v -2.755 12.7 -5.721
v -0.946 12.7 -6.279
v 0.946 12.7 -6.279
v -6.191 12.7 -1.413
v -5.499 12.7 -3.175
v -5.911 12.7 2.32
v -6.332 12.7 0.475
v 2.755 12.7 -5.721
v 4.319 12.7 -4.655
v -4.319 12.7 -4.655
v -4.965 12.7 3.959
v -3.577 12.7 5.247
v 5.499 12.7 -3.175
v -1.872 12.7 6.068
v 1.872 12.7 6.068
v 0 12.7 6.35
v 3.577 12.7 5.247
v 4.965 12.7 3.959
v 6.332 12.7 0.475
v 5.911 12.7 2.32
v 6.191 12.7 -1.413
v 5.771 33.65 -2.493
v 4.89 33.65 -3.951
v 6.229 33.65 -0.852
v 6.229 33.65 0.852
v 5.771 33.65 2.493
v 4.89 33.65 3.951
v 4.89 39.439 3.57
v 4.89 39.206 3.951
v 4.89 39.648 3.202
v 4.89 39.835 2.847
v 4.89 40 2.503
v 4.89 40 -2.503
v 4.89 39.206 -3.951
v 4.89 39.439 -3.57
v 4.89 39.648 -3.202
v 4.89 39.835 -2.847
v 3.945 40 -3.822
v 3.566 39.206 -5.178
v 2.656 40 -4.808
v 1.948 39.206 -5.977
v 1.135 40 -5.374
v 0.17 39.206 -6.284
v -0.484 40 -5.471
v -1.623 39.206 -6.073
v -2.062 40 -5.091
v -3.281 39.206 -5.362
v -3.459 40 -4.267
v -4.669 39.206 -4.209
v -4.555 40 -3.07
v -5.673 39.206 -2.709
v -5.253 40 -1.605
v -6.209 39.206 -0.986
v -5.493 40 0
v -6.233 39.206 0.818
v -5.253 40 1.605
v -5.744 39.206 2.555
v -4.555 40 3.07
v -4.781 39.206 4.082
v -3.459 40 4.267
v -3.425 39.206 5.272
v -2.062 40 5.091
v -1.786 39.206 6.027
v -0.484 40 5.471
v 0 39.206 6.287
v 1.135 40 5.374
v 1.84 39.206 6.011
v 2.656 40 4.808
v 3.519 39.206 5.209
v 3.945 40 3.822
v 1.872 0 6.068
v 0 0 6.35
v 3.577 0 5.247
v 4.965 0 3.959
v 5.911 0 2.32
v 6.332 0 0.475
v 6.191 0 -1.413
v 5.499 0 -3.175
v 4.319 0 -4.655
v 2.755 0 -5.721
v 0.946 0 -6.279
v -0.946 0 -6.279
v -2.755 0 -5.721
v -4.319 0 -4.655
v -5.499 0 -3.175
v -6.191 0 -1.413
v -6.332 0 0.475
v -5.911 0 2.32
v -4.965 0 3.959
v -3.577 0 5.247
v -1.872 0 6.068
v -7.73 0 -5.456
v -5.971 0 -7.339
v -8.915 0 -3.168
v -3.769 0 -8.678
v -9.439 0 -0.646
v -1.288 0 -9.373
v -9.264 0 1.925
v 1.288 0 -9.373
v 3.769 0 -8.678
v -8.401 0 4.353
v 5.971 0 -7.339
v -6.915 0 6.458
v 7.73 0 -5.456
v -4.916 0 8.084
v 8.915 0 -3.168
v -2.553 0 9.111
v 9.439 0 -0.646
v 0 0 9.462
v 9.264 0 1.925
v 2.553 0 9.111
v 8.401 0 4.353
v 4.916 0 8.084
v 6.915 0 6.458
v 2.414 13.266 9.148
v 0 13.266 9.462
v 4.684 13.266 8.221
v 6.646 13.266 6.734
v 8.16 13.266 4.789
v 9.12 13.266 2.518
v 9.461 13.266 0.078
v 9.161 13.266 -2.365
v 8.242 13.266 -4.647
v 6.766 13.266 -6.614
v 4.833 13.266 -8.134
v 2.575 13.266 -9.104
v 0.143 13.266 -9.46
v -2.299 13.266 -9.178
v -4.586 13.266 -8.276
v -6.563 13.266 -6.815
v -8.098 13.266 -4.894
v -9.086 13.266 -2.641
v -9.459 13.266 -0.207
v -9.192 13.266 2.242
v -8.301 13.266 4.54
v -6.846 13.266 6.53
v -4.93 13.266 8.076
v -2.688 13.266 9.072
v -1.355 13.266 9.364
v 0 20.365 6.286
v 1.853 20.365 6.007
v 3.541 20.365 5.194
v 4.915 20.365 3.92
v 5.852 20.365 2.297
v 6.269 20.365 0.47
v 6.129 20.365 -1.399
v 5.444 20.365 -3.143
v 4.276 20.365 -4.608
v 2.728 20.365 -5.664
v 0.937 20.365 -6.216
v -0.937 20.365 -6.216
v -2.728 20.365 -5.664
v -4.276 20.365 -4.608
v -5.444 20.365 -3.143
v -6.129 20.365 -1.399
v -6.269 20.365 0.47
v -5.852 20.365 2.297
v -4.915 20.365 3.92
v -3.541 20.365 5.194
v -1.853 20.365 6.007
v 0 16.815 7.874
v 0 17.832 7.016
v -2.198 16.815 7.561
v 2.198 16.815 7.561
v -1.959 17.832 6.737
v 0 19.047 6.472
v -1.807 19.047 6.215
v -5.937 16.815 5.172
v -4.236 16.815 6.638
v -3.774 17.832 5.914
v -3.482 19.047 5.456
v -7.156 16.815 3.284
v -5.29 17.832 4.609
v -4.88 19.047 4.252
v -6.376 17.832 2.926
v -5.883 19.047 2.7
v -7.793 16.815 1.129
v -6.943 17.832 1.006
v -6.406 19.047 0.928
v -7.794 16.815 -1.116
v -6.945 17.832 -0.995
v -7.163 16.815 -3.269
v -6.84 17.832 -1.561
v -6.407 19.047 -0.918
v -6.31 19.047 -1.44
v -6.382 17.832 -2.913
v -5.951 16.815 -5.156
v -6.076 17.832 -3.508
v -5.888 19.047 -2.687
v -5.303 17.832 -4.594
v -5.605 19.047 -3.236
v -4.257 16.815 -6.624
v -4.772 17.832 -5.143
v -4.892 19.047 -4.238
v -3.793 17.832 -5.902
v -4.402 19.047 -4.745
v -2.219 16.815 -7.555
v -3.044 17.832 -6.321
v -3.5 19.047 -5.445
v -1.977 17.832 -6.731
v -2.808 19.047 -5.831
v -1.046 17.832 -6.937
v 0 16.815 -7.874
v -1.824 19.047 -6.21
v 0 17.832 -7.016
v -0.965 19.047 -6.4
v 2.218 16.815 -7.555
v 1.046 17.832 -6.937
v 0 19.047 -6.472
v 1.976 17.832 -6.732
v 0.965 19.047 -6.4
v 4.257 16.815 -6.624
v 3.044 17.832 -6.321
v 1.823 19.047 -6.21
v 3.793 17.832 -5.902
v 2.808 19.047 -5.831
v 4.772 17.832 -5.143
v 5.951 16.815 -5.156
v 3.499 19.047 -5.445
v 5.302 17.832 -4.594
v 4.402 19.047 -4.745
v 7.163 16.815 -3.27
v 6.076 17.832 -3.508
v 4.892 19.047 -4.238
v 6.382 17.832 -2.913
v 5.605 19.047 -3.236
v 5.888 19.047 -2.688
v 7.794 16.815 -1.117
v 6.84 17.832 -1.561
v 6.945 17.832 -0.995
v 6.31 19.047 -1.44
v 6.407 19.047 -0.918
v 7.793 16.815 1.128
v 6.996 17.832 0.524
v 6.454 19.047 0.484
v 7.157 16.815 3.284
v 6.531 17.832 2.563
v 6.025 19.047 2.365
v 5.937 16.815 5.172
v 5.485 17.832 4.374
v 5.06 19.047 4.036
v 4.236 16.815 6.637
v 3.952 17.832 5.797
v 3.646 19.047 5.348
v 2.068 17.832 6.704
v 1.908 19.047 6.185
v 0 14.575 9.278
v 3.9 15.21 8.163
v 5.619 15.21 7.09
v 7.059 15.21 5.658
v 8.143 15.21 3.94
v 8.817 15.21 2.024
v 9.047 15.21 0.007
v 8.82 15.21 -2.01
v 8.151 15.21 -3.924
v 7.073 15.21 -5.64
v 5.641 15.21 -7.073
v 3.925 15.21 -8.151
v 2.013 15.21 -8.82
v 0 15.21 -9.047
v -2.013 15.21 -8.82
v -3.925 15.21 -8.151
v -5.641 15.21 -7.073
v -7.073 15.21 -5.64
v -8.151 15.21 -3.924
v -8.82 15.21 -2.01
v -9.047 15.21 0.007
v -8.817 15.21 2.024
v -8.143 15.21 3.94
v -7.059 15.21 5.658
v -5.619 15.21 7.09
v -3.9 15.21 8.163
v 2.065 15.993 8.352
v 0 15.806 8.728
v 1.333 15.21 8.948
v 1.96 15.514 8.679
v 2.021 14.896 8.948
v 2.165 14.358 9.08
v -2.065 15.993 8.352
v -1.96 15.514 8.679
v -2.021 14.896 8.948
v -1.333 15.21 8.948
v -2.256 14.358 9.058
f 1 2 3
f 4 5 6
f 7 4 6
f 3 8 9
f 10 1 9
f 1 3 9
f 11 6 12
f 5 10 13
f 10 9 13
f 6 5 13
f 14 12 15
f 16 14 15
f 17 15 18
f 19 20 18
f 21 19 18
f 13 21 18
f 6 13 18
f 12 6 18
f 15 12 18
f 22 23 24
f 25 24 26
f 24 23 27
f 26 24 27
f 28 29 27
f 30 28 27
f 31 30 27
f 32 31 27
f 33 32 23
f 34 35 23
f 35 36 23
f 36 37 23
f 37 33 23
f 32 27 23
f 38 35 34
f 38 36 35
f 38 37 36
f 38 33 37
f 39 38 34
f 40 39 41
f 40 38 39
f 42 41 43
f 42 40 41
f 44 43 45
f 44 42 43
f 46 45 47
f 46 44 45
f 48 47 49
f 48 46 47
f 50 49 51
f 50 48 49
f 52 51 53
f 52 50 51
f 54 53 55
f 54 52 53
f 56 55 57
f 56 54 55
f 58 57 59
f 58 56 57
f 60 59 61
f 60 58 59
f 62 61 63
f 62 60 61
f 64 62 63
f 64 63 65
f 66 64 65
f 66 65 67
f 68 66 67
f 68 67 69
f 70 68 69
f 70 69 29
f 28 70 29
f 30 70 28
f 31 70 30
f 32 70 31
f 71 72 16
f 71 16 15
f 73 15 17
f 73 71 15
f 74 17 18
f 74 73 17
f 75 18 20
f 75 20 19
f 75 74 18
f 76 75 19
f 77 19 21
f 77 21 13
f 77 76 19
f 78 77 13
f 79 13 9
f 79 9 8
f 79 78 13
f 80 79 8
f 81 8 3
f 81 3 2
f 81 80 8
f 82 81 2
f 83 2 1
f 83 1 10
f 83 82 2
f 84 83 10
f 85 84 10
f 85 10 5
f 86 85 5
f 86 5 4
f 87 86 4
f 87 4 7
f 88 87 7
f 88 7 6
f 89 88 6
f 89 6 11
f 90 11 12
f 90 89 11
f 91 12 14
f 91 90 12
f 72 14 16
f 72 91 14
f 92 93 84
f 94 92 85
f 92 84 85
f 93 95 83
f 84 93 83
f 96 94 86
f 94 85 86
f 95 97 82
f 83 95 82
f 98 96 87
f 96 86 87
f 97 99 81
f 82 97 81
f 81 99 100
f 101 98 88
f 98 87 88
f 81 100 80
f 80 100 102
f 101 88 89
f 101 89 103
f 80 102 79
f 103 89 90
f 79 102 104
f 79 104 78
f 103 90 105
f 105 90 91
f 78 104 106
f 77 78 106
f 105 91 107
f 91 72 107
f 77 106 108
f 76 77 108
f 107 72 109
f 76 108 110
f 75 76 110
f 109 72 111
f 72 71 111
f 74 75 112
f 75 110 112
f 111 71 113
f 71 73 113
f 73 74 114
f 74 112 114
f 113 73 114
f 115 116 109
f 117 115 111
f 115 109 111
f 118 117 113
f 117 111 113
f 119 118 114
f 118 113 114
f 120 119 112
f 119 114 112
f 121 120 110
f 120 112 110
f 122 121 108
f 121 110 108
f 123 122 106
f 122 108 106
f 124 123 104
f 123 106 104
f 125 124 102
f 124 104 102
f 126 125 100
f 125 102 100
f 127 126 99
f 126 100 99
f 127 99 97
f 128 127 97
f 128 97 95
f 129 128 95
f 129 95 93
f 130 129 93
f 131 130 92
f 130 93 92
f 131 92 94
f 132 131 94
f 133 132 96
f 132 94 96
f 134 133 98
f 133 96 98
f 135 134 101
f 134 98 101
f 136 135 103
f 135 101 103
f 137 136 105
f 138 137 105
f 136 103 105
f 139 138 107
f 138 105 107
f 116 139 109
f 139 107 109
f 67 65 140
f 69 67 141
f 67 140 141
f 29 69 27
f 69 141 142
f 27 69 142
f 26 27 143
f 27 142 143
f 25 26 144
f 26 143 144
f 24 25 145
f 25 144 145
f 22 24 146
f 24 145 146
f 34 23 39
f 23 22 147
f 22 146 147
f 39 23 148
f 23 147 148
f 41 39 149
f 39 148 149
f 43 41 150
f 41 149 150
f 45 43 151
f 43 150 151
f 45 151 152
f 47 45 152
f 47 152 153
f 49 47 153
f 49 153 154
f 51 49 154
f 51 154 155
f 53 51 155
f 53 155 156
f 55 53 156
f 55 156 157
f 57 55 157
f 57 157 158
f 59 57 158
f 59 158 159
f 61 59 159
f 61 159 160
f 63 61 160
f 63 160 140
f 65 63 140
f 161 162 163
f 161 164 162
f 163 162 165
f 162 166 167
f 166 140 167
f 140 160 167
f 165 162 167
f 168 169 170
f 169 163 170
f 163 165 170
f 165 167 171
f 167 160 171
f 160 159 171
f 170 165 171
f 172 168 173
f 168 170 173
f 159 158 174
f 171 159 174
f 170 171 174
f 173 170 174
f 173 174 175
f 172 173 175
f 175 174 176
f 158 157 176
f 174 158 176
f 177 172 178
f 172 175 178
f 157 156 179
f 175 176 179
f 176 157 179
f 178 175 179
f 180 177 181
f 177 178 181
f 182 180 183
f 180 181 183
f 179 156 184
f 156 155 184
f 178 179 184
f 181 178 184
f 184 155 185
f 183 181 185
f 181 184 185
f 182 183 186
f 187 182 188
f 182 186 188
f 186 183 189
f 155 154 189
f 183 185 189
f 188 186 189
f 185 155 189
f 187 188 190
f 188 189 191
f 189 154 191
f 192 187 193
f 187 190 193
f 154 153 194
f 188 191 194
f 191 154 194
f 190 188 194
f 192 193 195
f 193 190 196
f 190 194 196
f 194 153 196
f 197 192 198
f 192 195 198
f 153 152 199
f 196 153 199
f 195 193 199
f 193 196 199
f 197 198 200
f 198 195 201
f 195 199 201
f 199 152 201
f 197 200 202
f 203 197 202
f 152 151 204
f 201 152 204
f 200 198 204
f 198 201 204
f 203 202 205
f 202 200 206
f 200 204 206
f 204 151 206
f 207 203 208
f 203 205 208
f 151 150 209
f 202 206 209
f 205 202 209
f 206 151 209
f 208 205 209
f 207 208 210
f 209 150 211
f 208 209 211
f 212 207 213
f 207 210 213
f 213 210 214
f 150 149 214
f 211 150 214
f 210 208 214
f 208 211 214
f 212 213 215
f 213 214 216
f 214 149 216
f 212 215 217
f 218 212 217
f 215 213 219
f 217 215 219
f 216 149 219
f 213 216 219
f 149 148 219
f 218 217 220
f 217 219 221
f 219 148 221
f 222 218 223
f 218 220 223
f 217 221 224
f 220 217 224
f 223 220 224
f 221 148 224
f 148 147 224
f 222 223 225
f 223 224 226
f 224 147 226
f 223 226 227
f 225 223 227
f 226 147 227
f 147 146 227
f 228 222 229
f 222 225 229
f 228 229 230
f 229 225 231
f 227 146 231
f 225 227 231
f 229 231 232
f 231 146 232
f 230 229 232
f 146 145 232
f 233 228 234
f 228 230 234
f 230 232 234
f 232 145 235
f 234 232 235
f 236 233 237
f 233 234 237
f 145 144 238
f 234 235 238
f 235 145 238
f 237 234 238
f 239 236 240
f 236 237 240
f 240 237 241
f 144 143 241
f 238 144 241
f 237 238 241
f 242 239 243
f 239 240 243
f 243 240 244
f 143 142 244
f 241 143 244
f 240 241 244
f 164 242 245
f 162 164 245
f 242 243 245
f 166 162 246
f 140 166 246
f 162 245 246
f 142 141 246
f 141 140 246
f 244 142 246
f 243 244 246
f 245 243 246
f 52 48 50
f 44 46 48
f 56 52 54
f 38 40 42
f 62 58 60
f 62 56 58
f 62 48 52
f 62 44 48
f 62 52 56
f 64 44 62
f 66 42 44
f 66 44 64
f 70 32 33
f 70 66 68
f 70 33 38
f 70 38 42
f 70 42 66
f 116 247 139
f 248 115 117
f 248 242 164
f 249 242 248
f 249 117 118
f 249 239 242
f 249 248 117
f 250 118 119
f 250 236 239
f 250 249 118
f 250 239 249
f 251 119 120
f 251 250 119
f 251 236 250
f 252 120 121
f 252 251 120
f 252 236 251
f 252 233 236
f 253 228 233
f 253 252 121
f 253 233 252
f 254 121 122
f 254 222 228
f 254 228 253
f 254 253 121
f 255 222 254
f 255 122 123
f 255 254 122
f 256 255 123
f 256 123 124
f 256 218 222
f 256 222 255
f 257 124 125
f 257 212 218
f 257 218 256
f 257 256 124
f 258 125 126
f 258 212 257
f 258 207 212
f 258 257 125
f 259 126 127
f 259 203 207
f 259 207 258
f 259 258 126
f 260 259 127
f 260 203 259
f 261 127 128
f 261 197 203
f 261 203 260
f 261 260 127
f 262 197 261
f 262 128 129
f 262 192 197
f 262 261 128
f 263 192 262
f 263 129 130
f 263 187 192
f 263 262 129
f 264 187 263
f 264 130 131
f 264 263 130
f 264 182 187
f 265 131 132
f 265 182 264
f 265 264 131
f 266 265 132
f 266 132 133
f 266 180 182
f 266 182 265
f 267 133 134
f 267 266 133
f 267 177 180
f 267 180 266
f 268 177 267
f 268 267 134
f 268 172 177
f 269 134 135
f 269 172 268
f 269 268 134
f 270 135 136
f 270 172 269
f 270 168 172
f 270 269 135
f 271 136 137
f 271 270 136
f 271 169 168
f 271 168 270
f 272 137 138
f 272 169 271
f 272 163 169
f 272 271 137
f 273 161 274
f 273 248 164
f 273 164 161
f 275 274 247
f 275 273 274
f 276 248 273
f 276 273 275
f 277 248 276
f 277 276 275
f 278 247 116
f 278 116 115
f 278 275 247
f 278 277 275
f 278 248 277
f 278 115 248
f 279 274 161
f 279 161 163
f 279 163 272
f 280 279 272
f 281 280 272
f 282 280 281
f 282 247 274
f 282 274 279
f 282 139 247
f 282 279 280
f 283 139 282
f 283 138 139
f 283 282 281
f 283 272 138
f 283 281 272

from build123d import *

# Parameters (mm, degrees)
SKETCH1_R           = 6.2865
BASE_EXTRUDE_DEPTH  = 40
SKETCH3_R           = 9.4615
BOSS_EXTRUDE1_DEPTH = 15.875
SKETCH4_R           = 6.35
CUT_EXTRUDE1_DEPTH  = 12.7
FILLET1_R           = 4.7625
FILLET2_R           = 4.7625
CUT_EXTRUDE3_START  = -6.35
CUT_EXTRUDE3_DEPTH  = 6.35
CHAMFER1_SIZE       = 0.79375


with BuildPart() as part:
    # Sketch1 → Base-Extrude (new body)
    with BuildSketch(Plane(origin=(0, 0, 0), x_dir=(-1, 0, 0), z_dir=(0, 1, 0))):
        with Locations(Location((0, 0, 0), (0, 0, 90))):
            Circle(SKETCH1_R)
    extrude(amount=BASE_EXTRUDE_DEPTH)

    # Sketch3 → Boss-Extrude1 (add)
    with BuildSketch(Plane(origin=(0, 0, 0), x_dir=(-1, 0, 0), z_dir=(0, 1, 0))):
        with Locations(Location((0, 0, 0), (0, 0, 90))):
            Circle(SKETCH3_R)
    extrude(amount=BOSS_EXTRUDE1_DEPTH)

    # Sketch4 → Cut-Extrude1 (cut)
    with BuildSketch(Plane(origin=(0, 0, 0), x_dir=(-1, 0, 0), z_dir=(0, 1, 0))):
        with Locations(Location((0, 0, 0), (0, 0, 90))):
            Circle(SKETCH4_R)
    extrude(amount=CUT_EXTRUDE1_DEPTH, mode=Mode.SUBTRACT)

    # Fillet1
    # the kernel refuses this fillet: 4.7625 mm, written as the material it adds along each edge
    with BuildSketch(Plane(origin=(0, 15.875, 0), x_dir=(0, 0, 1), z_dir=(1, 0, 0))) as fillet1_piece_1:
        with BuildLine():
            CenterArc((11.049, -4.490128061), FILLET1_R, 109.471220634, 70.528779366)
            Line((6.2865, -4.490128061), (6.19125, -4.490128061))
            Line((6.19125, -4.490128061), (6.19125, 0))
            Line((6.19125, 0), (6.2865, 0.09525))
            ThreePointArc((6.2865, 0.09525), (7.874, 0.09525), (9.42975, 0.089802561))
            Line((9.42975, 0.089802561), (9.4615, 0))
        make_face()
    revolve(axis=Axis((0, 15.875, 0), (0, -1, 0)))

    # Fillet2
    fillet2_edges = [part.edges().sort_by_distance(p)[0] for p in [
        (0, 15.875, -9.4615),
    ]]
    fillet(fillet2_edges, radius=FILLET2_R)

    # Sketch7 → Cut-Extrude3 (cut)
    with BuildSketch(Plane(origin=(0, 40, 0), x_dir=(-1, 0, 0), z_dir=(0, 1, 0)).offset(CUT_EXTRUDE3_START)):
        with BuildLine():
            Line((-4.8895, 3.951312693), (-4.8895, -3.951312693))
            ThreePointArc((-4.8895, -3.951312693), (-6.2865, 0), (-4.8895, 3.951312693))
        make_face()
    extrude(amount=CUT_EXTRUDE3_DEPTH, mode=Mode.SUBTRACT)

    # Chamfer1
    chamfer1_edges = [part.edges().sort_by_distance(p)[0] for p in [
        (-5.67274226, 40, -2.70925774),
    ]]
    chamfer(chamfer1_edges, length=CHAMFER1_SIZE)


solid = part.part
